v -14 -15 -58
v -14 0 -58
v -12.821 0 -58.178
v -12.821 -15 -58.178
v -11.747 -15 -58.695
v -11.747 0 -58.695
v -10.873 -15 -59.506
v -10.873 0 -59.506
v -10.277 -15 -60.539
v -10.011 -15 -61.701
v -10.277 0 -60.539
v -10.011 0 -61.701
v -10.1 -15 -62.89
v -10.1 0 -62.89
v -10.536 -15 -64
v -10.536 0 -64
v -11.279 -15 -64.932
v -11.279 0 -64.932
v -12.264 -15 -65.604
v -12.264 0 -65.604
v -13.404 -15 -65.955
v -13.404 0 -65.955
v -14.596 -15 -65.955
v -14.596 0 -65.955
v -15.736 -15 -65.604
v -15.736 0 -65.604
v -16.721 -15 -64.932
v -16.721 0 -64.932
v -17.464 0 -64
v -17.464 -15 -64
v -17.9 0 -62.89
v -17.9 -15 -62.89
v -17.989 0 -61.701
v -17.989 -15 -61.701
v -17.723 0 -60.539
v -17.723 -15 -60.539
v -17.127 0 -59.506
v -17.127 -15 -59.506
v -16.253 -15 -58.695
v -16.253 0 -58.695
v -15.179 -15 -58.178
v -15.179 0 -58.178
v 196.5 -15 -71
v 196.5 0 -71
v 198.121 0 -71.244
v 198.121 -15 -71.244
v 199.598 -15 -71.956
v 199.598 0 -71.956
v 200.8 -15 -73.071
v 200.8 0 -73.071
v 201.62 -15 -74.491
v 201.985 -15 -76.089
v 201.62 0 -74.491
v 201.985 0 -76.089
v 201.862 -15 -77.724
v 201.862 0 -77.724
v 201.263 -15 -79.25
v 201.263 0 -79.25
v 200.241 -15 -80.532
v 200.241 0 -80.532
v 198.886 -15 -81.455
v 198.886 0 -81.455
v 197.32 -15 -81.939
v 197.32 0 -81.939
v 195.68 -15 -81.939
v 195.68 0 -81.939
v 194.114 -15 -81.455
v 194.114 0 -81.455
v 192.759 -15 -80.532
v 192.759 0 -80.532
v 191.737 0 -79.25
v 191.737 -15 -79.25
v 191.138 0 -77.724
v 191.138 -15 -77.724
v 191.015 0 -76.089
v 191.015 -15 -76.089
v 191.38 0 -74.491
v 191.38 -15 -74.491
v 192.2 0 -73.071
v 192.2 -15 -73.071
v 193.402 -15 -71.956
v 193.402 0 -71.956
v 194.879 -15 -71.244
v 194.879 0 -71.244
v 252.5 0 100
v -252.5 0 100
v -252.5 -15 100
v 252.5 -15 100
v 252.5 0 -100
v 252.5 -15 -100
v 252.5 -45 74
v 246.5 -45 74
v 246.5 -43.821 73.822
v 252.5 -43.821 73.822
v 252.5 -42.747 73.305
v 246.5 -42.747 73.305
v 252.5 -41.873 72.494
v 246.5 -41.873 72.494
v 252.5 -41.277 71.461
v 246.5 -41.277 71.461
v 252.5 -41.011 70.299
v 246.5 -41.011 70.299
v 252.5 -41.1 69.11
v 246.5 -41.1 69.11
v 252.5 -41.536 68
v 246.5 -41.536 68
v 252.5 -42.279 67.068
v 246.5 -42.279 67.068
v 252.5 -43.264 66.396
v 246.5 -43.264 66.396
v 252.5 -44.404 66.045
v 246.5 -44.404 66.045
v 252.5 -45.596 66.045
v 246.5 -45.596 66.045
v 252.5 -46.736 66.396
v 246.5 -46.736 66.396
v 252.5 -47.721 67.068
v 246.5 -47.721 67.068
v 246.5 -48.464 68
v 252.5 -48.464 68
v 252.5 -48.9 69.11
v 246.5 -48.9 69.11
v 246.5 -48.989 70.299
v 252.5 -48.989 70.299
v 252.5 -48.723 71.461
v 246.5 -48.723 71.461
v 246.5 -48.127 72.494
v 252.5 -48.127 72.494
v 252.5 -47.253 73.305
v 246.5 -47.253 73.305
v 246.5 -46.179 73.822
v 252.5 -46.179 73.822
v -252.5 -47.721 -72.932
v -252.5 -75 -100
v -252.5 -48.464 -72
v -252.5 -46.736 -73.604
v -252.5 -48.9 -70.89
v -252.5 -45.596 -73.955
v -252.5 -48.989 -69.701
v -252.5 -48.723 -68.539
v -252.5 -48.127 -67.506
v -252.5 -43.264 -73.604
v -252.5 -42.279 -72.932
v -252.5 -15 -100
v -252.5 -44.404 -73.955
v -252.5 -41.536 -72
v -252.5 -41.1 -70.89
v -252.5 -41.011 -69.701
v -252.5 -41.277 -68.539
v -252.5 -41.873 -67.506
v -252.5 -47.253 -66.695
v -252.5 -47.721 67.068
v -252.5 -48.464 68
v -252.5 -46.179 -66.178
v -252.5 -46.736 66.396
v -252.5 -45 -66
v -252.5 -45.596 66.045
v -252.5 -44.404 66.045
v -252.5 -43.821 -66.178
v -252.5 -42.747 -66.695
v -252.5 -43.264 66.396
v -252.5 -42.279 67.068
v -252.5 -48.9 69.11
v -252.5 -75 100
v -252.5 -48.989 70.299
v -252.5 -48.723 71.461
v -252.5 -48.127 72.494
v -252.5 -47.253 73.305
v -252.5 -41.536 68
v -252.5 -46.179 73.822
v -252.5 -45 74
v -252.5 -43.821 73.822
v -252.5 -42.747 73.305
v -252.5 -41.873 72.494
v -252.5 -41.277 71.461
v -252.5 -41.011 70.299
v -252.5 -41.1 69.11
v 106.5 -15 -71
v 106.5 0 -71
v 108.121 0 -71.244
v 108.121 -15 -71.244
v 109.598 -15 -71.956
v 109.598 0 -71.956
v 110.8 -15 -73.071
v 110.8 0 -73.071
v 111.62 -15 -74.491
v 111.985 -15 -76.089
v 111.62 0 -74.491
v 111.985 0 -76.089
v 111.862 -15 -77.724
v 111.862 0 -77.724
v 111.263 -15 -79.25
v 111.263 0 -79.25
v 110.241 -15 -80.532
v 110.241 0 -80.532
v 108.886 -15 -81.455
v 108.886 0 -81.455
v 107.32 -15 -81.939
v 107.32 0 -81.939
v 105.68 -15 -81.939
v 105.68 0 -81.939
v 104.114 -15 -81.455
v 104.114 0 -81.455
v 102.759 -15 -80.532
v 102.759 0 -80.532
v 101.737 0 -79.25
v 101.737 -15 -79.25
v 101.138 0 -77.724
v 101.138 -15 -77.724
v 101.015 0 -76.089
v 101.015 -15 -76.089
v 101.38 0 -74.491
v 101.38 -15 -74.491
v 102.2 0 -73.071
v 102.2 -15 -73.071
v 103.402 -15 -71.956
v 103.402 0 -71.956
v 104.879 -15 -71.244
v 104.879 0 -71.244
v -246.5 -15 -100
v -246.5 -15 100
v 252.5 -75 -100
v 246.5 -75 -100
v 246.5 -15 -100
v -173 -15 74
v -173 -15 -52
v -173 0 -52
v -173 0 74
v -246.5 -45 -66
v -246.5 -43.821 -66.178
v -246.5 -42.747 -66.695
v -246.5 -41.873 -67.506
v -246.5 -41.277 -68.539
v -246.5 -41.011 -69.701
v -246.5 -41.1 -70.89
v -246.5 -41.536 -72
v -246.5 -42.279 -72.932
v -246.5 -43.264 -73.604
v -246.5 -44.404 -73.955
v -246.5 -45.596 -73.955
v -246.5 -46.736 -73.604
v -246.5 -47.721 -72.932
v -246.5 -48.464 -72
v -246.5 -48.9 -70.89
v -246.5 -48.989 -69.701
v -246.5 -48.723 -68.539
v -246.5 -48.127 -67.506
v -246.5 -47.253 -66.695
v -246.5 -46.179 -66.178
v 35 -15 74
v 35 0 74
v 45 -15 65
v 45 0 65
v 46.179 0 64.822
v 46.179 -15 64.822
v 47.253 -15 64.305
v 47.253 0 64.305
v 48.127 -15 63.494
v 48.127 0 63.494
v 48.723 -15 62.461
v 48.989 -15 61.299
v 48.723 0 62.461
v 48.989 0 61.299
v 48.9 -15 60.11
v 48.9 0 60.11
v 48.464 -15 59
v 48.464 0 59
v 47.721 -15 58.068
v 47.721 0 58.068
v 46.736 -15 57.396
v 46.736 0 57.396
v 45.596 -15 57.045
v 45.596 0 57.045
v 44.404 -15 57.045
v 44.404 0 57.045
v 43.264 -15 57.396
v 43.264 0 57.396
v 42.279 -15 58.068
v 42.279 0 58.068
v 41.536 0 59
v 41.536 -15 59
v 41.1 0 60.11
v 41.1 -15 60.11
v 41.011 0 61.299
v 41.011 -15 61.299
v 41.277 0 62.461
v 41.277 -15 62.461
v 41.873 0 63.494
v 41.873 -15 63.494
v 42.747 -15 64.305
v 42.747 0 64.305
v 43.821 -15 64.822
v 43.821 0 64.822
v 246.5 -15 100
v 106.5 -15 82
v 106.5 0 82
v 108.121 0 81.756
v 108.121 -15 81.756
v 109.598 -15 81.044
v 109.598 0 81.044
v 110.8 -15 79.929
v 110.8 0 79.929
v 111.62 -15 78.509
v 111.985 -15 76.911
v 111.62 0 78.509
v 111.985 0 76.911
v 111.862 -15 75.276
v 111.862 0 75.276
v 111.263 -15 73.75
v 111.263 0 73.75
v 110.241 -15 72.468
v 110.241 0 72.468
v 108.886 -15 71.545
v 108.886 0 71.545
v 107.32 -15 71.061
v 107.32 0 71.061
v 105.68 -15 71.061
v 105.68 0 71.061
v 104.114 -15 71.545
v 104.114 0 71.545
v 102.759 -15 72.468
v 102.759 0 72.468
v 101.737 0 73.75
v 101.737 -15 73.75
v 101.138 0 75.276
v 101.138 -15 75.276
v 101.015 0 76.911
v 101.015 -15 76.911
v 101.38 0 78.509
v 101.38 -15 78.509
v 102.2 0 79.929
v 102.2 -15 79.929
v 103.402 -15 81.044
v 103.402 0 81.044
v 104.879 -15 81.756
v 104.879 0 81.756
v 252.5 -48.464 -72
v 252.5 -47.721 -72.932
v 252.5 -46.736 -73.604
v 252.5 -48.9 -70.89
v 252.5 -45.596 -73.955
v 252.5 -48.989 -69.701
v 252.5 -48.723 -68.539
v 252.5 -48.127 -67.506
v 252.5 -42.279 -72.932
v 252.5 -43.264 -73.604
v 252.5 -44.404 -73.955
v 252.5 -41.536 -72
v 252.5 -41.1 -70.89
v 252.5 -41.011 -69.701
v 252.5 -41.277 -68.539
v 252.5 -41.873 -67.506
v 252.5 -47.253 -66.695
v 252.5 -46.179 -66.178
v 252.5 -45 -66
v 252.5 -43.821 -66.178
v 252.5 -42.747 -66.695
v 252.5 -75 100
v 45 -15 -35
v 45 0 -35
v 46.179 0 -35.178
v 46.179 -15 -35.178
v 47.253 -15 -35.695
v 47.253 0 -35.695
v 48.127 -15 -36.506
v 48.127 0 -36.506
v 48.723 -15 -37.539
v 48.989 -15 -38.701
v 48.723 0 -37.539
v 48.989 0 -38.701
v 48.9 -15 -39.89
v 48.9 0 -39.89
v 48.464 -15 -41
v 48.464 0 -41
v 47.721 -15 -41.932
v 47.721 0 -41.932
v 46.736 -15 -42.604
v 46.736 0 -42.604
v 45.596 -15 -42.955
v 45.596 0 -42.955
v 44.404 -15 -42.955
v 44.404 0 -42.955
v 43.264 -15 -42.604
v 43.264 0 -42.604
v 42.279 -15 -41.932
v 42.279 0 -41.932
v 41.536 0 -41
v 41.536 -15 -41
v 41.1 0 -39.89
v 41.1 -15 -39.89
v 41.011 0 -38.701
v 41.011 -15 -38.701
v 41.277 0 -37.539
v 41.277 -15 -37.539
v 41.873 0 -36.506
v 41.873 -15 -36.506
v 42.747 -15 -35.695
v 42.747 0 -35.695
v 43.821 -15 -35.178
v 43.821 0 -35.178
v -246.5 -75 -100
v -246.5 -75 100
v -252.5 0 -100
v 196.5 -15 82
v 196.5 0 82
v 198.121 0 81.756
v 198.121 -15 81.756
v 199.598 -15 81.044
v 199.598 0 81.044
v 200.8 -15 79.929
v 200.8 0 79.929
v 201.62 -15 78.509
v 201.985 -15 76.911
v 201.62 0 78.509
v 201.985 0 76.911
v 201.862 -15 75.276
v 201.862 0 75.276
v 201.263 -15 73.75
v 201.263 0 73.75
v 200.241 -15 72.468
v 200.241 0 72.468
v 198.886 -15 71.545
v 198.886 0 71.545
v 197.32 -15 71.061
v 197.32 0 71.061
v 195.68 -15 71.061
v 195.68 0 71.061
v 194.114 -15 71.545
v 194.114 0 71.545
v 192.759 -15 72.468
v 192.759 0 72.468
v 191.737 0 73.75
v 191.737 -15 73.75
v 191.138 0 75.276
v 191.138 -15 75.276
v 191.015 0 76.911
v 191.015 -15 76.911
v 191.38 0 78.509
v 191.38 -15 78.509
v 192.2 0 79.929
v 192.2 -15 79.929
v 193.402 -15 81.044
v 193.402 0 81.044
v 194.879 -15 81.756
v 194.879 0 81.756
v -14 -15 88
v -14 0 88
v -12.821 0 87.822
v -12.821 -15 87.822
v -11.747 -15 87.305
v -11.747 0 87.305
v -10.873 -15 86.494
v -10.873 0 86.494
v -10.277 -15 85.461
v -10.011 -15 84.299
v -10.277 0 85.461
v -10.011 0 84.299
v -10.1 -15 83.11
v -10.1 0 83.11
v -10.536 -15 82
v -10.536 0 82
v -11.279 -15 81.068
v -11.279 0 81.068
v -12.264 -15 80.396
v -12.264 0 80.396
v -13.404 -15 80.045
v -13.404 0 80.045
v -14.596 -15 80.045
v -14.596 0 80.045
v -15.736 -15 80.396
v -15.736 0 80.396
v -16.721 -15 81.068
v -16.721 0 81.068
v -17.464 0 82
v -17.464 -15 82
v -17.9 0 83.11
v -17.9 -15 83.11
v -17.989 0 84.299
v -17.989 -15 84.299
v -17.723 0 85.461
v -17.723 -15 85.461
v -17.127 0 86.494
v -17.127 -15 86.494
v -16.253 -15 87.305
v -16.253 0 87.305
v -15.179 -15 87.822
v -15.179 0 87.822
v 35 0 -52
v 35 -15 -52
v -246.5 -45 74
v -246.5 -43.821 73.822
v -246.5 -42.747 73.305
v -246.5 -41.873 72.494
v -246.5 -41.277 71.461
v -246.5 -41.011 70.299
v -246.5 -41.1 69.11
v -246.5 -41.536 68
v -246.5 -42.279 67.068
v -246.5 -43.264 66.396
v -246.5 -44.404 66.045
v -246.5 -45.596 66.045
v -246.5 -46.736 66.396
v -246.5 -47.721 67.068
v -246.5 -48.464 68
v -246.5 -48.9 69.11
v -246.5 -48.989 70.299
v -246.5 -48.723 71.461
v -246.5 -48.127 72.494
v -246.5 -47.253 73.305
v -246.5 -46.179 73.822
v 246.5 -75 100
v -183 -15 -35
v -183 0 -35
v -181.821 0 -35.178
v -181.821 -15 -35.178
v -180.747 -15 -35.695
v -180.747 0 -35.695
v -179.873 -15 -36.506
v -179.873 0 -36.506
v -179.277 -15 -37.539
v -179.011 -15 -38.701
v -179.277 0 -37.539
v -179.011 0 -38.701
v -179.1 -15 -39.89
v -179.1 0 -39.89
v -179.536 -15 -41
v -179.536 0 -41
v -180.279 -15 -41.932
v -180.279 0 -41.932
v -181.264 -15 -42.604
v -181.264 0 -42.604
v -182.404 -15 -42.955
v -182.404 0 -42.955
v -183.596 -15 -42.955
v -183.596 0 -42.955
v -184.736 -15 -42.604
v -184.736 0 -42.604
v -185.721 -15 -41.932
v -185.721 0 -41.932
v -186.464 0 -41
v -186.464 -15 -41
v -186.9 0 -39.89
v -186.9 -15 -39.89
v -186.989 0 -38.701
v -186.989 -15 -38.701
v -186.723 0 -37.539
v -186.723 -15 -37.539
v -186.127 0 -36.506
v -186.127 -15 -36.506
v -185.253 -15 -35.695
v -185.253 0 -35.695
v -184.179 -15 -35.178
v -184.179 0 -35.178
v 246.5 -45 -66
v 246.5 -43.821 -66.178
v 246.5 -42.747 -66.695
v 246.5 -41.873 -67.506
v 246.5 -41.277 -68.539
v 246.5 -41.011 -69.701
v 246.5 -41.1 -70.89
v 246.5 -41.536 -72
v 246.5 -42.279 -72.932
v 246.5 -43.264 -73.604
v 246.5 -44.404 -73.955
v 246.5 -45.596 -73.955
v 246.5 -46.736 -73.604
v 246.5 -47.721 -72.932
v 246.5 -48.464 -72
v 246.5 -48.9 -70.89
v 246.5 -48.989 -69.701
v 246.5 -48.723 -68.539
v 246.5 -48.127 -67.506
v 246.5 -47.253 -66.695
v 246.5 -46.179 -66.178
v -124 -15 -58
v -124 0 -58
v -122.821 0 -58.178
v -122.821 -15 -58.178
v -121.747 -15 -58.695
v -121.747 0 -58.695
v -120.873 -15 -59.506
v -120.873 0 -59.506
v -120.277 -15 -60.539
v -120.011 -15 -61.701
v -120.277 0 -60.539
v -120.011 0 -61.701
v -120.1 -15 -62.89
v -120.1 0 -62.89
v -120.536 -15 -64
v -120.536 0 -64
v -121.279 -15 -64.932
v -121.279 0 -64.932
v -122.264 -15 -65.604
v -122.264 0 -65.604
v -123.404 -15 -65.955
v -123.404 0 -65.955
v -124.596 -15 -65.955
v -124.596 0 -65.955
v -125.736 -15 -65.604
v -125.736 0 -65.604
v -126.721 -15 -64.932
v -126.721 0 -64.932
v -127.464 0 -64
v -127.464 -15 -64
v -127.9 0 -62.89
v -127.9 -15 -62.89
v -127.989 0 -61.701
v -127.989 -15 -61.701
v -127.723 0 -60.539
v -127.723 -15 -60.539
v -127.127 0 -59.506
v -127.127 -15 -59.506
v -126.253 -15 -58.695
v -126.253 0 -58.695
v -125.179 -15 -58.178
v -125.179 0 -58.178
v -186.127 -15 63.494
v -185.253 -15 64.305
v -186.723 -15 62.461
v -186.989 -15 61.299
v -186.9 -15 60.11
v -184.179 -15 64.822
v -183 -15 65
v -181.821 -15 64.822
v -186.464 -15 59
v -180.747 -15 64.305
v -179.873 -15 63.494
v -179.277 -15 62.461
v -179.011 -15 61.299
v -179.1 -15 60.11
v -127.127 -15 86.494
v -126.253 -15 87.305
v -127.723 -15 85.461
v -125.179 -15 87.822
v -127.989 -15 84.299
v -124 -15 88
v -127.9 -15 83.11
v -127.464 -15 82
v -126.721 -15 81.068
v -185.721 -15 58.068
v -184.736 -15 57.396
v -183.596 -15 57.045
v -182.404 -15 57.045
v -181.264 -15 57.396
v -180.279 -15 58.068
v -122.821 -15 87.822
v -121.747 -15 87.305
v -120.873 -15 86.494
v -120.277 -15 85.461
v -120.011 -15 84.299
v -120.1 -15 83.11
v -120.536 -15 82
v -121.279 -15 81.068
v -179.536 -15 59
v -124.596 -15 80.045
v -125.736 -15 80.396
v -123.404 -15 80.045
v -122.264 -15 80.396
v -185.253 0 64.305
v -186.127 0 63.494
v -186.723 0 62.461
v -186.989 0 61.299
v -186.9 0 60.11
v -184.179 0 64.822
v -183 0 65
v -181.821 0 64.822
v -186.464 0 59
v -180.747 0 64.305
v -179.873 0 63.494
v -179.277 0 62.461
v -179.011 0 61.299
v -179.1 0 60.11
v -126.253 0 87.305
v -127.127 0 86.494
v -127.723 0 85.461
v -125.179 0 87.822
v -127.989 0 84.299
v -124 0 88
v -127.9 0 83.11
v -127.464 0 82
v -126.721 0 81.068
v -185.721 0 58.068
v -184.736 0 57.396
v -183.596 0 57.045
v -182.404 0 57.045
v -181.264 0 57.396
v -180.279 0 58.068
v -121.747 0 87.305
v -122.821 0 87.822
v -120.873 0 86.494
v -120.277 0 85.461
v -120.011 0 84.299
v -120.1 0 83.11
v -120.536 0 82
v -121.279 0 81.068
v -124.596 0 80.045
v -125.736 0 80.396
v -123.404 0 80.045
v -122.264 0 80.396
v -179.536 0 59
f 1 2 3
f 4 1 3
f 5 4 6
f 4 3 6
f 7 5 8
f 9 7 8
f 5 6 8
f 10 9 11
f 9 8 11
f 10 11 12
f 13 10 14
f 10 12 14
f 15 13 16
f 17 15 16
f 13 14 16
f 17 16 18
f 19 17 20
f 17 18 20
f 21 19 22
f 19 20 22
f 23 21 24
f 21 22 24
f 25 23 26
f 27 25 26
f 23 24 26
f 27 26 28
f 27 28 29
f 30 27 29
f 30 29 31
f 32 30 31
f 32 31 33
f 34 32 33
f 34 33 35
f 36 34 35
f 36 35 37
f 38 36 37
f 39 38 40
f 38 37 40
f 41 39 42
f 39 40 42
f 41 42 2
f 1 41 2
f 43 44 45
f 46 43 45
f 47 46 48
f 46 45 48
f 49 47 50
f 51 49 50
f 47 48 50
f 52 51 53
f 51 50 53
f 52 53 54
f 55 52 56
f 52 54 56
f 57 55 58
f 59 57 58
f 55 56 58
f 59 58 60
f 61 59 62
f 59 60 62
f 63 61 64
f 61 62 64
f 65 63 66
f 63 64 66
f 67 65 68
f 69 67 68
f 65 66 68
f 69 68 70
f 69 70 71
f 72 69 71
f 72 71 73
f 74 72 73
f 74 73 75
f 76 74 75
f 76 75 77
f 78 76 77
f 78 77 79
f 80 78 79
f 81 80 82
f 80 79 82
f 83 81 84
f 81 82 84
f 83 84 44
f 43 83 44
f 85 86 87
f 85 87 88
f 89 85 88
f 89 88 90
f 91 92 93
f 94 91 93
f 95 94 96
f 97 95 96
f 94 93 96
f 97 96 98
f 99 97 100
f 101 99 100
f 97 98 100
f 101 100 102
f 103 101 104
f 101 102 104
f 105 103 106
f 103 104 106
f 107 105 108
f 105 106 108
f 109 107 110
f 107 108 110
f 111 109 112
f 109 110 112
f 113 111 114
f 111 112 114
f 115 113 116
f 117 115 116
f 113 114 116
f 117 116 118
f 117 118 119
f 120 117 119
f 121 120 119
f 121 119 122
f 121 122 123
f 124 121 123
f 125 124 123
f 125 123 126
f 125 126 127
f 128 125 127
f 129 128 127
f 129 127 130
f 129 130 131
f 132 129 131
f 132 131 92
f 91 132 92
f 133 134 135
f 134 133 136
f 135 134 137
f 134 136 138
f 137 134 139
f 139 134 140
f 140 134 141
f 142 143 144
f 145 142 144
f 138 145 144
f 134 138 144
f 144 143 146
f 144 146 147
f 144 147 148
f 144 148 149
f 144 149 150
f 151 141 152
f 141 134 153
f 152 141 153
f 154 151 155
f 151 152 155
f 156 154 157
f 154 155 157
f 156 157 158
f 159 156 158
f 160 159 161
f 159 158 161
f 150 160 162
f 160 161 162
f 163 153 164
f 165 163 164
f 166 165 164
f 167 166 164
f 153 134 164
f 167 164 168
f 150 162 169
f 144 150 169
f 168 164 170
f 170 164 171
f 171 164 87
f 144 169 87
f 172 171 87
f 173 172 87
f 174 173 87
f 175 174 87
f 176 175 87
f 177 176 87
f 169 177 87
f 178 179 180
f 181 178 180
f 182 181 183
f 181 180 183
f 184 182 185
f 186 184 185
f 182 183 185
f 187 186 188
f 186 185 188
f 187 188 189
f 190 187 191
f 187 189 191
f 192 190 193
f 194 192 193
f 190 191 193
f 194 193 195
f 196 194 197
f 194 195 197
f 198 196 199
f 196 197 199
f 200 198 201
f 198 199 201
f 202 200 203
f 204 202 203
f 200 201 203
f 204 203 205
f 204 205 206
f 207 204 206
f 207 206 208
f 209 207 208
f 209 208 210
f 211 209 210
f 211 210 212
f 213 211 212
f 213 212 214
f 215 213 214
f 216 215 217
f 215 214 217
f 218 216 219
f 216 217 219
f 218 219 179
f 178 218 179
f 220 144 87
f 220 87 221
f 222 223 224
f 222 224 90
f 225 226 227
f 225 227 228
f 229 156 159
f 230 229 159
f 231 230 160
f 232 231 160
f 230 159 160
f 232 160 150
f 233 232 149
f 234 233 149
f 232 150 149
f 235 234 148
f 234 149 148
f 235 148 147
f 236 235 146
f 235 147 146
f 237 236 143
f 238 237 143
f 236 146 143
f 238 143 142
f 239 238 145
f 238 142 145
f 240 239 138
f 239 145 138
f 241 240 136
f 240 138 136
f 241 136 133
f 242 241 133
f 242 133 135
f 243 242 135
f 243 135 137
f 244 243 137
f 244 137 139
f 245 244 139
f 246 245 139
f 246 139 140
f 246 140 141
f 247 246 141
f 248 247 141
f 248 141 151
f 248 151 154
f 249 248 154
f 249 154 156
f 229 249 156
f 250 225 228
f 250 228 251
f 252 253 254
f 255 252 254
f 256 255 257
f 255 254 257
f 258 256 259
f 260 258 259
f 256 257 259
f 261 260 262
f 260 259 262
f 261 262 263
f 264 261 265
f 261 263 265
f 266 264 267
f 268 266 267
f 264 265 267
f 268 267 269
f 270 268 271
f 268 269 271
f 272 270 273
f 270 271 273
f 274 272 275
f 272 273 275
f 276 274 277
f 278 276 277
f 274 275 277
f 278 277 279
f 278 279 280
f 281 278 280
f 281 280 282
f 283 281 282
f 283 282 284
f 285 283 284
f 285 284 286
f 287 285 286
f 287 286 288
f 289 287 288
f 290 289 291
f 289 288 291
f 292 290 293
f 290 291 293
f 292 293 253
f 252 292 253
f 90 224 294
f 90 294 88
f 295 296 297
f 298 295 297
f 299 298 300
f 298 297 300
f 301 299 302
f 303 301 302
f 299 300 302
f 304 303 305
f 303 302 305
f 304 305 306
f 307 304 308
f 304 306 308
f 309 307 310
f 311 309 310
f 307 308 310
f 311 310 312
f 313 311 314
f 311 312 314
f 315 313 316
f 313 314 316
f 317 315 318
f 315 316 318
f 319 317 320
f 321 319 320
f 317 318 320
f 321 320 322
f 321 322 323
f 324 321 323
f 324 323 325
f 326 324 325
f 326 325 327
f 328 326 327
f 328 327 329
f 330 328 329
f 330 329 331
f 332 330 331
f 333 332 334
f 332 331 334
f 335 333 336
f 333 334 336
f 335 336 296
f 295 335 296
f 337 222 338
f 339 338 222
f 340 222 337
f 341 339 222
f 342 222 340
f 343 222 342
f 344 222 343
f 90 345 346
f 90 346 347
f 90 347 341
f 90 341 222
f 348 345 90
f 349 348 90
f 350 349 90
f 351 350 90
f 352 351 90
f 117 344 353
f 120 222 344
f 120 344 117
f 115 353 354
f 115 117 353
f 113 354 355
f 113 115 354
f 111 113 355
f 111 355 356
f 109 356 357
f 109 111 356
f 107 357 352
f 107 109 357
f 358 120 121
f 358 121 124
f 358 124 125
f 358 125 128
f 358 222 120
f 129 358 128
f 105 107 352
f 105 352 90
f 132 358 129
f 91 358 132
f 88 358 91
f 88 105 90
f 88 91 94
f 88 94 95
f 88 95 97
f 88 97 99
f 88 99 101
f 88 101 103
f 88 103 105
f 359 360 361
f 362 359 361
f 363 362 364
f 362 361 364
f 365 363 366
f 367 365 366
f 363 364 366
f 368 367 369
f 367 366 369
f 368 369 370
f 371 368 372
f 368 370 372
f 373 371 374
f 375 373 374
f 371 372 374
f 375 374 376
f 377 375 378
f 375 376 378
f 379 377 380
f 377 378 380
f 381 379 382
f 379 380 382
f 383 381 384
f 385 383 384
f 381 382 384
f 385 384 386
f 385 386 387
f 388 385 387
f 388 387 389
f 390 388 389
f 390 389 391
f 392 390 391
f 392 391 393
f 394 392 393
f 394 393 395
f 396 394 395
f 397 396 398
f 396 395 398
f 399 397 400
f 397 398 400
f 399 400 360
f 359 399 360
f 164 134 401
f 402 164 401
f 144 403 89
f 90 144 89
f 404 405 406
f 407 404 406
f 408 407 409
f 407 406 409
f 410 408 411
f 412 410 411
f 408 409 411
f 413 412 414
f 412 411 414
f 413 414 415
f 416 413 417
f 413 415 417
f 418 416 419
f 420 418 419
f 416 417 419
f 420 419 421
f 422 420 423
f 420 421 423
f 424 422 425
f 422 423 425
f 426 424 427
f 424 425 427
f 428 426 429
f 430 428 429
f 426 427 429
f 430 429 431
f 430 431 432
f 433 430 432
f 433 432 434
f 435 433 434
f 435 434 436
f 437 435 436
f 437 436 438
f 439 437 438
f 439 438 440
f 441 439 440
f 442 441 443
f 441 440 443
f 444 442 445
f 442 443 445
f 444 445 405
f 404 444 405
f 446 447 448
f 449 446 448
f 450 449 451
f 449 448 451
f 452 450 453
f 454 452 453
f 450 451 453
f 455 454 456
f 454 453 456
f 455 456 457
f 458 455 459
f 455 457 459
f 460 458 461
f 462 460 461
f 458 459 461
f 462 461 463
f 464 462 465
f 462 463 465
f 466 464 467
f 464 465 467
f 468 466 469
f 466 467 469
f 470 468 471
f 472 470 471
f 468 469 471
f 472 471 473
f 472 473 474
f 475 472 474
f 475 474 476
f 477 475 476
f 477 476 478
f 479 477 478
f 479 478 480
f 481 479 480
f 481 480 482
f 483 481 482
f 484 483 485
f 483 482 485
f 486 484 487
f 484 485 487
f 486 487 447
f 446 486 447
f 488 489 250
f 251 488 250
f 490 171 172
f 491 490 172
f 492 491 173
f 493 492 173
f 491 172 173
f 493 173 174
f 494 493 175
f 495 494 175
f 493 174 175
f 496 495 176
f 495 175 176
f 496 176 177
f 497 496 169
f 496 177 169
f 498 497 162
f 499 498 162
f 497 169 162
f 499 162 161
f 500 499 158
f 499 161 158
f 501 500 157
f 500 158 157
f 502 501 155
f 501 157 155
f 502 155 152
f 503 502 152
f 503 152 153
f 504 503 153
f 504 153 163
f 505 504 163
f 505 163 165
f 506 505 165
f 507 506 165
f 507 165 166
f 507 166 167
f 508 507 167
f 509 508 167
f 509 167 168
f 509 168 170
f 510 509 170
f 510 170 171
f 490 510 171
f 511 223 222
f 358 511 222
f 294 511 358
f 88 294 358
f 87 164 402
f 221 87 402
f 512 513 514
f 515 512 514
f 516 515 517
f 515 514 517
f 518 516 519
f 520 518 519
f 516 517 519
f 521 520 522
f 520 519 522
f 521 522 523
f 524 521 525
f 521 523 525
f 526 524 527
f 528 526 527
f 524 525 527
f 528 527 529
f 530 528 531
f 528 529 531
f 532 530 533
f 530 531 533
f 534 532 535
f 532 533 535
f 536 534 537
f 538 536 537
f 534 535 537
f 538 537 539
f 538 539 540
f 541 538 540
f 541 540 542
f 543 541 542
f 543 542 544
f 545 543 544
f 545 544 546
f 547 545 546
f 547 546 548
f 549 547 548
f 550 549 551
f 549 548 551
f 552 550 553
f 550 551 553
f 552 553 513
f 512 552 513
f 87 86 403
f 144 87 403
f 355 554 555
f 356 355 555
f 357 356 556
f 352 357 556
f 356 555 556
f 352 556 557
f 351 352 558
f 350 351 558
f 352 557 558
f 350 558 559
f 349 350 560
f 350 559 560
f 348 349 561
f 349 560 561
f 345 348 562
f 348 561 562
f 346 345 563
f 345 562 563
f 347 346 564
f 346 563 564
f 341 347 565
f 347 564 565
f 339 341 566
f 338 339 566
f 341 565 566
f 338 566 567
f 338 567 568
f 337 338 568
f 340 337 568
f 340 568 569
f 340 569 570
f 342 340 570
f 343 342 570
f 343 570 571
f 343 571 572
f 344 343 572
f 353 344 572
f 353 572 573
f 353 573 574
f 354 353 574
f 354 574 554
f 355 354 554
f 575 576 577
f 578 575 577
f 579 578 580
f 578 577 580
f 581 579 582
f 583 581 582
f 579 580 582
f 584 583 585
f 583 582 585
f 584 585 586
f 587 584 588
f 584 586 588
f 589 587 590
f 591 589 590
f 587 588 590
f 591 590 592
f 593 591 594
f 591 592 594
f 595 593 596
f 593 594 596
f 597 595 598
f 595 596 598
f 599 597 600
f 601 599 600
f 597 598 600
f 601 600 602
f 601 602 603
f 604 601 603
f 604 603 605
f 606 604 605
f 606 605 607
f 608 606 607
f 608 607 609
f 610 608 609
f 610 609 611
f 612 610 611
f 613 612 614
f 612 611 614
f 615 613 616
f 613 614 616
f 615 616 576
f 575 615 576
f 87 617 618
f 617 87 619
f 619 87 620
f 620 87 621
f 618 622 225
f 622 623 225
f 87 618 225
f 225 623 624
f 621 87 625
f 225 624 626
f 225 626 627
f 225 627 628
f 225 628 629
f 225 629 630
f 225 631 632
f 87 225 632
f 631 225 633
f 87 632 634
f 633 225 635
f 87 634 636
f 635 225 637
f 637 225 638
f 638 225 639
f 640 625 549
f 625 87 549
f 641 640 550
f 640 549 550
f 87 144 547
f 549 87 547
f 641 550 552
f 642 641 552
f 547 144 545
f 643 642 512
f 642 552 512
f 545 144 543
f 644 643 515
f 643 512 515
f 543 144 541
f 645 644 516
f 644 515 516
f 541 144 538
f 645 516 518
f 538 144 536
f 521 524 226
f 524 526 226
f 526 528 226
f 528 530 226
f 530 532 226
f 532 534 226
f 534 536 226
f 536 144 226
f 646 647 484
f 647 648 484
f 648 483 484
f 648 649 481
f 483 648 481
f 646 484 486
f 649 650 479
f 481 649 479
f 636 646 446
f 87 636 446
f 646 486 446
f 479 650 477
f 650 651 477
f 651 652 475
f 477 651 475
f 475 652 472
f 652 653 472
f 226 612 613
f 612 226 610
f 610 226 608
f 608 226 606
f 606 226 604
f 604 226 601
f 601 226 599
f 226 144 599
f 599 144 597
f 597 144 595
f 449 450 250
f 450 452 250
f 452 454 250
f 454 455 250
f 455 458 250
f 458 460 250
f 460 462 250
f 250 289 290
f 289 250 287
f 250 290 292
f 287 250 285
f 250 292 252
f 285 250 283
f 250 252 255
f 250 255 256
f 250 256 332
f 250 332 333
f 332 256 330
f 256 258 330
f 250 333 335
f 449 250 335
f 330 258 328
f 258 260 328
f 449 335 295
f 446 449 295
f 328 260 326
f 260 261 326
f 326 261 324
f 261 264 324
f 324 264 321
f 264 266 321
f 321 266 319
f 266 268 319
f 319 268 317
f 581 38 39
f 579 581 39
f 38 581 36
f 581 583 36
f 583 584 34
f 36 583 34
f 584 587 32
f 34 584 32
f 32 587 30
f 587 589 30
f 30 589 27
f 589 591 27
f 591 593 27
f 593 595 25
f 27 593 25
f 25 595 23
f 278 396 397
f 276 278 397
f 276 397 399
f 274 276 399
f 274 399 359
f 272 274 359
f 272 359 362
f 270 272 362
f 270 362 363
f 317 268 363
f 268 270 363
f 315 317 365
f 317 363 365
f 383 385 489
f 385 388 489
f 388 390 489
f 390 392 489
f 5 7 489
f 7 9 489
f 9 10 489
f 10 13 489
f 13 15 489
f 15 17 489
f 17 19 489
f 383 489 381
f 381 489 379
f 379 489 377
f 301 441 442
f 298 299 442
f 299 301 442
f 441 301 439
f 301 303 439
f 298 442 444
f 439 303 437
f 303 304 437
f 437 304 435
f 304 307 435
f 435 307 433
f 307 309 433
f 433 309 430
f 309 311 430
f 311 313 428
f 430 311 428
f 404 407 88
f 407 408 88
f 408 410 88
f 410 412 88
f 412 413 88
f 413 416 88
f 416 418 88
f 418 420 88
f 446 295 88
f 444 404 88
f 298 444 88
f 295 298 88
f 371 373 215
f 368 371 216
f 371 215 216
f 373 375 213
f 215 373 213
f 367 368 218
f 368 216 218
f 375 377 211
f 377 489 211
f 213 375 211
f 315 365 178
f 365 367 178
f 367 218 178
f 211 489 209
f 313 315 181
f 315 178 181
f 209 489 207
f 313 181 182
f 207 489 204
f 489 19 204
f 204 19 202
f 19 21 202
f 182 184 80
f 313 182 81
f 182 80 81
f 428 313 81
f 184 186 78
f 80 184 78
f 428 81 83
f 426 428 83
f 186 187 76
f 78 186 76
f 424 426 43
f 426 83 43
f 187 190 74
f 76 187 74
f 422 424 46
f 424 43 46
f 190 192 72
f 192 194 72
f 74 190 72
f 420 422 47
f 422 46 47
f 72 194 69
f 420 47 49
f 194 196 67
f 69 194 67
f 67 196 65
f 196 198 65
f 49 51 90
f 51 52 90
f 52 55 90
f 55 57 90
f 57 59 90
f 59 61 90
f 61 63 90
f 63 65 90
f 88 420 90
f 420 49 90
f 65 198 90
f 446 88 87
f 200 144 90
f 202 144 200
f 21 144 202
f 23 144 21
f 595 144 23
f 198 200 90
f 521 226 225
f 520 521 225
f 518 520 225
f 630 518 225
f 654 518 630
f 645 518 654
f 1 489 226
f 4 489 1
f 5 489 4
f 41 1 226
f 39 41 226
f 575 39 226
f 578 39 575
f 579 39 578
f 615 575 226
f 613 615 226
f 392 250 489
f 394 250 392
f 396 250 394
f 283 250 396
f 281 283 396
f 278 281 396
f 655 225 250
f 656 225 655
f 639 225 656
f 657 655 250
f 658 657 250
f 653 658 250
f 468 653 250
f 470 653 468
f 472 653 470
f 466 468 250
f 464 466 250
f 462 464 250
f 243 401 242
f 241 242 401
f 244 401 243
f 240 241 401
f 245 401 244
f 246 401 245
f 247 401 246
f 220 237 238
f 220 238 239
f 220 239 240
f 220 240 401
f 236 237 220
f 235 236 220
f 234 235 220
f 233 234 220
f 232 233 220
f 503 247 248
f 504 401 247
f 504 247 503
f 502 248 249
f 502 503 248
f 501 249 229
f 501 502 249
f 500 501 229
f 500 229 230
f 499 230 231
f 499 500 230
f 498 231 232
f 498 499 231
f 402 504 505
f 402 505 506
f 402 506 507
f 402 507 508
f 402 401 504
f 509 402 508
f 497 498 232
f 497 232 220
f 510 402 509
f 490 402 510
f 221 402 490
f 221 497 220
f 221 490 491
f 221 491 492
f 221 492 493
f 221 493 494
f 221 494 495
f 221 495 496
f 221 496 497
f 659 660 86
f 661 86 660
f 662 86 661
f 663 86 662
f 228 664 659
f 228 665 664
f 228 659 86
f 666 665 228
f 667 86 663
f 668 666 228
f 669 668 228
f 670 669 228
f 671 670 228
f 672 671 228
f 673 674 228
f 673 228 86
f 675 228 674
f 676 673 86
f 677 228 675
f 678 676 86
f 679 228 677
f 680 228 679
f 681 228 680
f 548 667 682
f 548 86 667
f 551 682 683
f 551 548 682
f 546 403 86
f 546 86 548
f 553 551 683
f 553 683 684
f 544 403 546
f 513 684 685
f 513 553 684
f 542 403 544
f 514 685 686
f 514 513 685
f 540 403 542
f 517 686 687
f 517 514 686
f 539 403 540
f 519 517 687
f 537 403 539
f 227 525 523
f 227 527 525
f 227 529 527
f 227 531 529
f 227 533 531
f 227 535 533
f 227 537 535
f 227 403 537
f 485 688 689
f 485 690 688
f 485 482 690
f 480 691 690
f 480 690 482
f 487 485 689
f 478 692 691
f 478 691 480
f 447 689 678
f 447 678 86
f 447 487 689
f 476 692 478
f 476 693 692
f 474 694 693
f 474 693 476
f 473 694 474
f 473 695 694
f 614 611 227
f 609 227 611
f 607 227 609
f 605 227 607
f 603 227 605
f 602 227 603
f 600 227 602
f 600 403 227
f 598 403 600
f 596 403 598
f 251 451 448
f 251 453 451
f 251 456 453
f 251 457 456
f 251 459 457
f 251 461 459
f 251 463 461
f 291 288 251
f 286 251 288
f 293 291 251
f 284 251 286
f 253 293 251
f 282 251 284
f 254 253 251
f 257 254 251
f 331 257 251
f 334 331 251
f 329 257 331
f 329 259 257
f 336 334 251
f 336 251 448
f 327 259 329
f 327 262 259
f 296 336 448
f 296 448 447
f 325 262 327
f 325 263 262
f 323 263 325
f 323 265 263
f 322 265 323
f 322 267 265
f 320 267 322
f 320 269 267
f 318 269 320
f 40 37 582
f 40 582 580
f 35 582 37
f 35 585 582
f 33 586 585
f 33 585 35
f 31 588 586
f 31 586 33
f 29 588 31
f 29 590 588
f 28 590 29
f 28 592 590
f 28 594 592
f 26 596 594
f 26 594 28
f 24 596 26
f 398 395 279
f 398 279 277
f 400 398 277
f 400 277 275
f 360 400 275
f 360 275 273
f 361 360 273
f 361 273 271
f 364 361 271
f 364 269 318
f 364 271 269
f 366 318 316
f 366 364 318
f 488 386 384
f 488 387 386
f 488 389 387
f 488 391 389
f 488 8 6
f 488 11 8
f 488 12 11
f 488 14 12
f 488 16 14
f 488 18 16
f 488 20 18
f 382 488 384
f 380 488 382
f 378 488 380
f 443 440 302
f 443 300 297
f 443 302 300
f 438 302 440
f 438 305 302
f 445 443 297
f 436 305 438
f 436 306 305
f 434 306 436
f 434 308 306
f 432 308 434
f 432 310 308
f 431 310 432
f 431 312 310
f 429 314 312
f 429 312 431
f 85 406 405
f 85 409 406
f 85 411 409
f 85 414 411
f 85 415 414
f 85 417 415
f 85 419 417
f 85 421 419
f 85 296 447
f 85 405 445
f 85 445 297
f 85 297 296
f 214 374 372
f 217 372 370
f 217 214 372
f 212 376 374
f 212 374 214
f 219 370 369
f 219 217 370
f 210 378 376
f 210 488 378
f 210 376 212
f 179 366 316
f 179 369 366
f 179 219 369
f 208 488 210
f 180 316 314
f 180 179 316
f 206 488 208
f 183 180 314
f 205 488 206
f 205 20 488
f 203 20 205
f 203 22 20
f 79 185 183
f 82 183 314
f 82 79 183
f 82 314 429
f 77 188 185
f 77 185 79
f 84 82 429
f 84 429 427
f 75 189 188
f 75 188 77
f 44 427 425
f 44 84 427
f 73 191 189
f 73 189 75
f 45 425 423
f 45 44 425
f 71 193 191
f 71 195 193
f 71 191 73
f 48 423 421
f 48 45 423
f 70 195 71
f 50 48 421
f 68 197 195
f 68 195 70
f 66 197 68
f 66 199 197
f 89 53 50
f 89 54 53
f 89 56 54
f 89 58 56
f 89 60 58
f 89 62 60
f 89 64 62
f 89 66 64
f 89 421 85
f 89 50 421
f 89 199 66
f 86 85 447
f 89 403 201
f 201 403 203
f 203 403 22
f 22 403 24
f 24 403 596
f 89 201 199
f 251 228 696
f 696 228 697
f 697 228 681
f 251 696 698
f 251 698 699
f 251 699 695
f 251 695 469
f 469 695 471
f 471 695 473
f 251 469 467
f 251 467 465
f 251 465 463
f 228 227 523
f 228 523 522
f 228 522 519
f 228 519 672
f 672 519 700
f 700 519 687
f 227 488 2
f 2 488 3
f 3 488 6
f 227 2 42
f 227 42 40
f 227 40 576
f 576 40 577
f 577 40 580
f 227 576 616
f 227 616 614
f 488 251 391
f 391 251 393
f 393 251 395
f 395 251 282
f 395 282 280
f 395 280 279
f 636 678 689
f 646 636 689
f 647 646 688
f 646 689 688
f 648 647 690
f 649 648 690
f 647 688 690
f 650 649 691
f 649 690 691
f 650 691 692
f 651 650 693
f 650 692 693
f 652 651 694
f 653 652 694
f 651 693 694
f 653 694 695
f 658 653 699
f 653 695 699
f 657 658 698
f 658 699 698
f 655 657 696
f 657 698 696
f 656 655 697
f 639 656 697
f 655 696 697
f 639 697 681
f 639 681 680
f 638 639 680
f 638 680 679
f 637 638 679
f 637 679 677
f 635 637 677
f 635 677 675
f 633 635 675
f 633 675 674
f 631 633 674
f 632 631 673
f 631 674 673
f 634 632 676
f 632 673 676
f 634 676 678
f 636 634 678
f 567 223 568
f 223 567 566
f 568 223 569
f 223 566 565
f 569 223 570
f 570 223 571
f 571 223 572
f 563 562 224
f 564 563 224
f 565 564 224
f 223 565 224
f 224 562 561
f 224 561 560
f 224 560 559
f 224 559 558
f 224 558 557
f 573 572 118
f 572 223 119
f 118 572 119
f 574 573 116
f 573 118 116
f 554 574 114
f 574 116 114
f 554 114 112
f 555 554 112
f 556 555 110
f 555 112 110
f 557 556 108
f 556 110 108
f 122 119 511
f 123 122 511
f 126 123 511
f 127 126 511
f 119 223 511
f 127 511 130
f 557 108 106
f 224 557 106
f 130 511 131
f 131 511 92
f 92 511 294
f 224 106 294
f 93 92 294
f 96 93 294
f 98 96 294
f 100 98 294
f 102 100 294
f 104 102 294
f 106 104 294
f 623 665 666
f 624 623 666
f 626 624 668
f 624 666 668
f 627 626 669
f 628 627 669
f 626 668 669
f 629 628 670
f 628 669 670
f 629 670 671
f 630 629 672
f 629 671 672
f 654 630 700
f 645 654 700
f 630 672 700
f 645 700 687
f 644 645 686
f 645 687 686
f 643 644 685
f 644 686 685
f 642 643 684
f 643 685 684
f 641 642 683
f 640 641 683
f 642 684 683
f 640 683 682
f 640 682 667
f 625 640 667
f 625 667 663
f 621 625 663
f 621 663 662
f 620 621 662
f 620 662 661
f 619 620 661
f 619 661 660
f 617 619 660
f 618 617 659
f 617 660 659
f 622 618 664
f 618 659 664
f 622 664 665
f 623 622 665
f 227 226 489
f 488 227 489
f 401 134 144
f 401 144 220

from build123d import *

# Parameters (mm, degrees)
SKETCH1_W              = 505
SKETCH1_H              = 200
SKETCH1_R              = 5.5
SKETCH1_R_2            = 4
BOSS_EXTRUDE1_DEPTH    = 15
SKETCH2_W              = 208
SKETCH2_H              = 126
SHREDDER_OPENING_DEPTH = 272.994944806
SKETCH4_W              = 6
SKETCH4_H              = 60
BOSS_EXTRUDE2_DEPTH    = 200
BOSS_EXTRUDE2_2_DEPTH  = 200
SKETCH5_R              = 4
CUT_EXTRUDE1_DEPTH     = 521.240329079


with BuildPart() as part:
    # Sketch1 → Boss-Extrude1 (new body)
    with BuildSketch(Plane(origin=(0, 0, 0), x_dir=(1, 0, 0), z_dir=(0, 1, 0))):
        Rectangle(SKETCH1_W, SKETCH1_H)
        with Locations(Location((106.5, -76.5, 0), (0, 0, 270))):
            Circle(SKETCH1_R, mode=Mode.SUBTRACT)
        with Locations(Location((196.5, -76.5, 0), (0, 0, 270))):
            Circle(SKETCH1_R, mode=Mode.SUBTRACT)
        with Locations(Location((196.5, 76.5, 0), (0, 0, 270))):
            Circle(SKETCH1_R, mode=Mode.SUBTRACT)
        with Locations(Location((106.5, 76.5, 0), (0, 0, 270))):
            Circle(SKETCH1_R, mode=Mode.SUBTRACT)
        with Locations(Location((45, -61, 0), (0, 0, 270))):
            Circle(SKETCH1_R_2, mode=Mode.SUBTRACT)
        with Locations(Location((-14, -84, 0), (0, 0, 270))):
            Circle(SKETCH1_R_2, mode=Mode.SUBTRACT)
        with Locations(Location((-124, -84, 0), (0, 0, 270))):
            Circle(SKETCH1_R_2, mode=Mode.SUBTRACT)
        with Locations(Location((-183, -61, 0), (0, 0, 270))):
            Circle(SKETCH1_R_2, mode=Mode.SUBTRACT)
        with Locations(Location((-183, 39, 0), (0, 0, 270))):
            Circle(SKETCH1_R_2, mode=Mode.SUBTRACT)
        with Locations(Location((-124, 62, 0), (0, 0, 270))):
            Circle(SKETCH1_R_2, mode=Mode.SUBTRACT)
        with Locations(Location((45, 39, 0), (0, 0, 270))):
            Circle(SKETCH1_R_2, mode=Mode.SUBTRACT)
        with Locations(Location((-14, 62, 0), (0, 0, 270))):
            Circle(SKETCH1_R_2, mode=Mode.SUBTRACT)
    extrude(amount=-BOSS_EXTRUDE1_DEPTH)

    # Sketch2 → Shredder Opening (cut, through all)
    with BuildSketch(Plane.XZ.offset(15)):
        with Locations((-69, 11)):
            Rectangle(SKETCH2_W, SKETCH2_H)
    extrude(amount=-SHREDDER_OPENING_DEPTH, mode=Mode.SUBTRACT)


with BuildPart() as body_2:
    # Sketch4 → Boss-Extrude2 (new, through all)
    with BuildSketch(Plane.XY.offset(100)):
        with Locations((-249.5, -45)):
            Rectangle(SKETCH4_W, SKETCH4_H)
    extrude(amount=-BOSS_EXTRUDE2_DEPTH)


with BuildPart() as body_3:
    # Sketch4 → Boss-Extrude2 2 (new, through all)
    with BuildSketch(Plane.XY.offset(100)):
        with Locations((249.5, -45)):
            Rectangle(SKETCH4_W, SKETCH4_H)
    extrude(amount=-BOSS_EXTRUDE2_2_DEPTH)


with BuildPart() as cut_extrude1_tool:
    # Sketch5 → Cut-Extrude1 (new, through all)
    with BuildSketch(Plane.ZY.offset(252.5)):
        with Locations((70, -45)):
            Circle(SKETCH5_R)
        with Locations((-70, -45)):
            Circle(SKETCH5_R)
    extrude(amount=-CUT_EXTRUDE1_DEPTH)


with BuildPart() as body_2_1:
    add(body_2.part)

    # Cut-Extrude1: cut by cut_extrude1_tool
    add(cut_extrude1_tool.part, mode=Mode.SUBTRACT)


with BuildPart() as body_3_1:
    add(body_3.part)

    # Cut-Extrude1: cut by cut_extrude1_tool
    add(cut_extrude1_tool.part, mode=Mode.SUBTRACT)


solid = Compound([part.part, body_2_1.part, body_3_1.part])
